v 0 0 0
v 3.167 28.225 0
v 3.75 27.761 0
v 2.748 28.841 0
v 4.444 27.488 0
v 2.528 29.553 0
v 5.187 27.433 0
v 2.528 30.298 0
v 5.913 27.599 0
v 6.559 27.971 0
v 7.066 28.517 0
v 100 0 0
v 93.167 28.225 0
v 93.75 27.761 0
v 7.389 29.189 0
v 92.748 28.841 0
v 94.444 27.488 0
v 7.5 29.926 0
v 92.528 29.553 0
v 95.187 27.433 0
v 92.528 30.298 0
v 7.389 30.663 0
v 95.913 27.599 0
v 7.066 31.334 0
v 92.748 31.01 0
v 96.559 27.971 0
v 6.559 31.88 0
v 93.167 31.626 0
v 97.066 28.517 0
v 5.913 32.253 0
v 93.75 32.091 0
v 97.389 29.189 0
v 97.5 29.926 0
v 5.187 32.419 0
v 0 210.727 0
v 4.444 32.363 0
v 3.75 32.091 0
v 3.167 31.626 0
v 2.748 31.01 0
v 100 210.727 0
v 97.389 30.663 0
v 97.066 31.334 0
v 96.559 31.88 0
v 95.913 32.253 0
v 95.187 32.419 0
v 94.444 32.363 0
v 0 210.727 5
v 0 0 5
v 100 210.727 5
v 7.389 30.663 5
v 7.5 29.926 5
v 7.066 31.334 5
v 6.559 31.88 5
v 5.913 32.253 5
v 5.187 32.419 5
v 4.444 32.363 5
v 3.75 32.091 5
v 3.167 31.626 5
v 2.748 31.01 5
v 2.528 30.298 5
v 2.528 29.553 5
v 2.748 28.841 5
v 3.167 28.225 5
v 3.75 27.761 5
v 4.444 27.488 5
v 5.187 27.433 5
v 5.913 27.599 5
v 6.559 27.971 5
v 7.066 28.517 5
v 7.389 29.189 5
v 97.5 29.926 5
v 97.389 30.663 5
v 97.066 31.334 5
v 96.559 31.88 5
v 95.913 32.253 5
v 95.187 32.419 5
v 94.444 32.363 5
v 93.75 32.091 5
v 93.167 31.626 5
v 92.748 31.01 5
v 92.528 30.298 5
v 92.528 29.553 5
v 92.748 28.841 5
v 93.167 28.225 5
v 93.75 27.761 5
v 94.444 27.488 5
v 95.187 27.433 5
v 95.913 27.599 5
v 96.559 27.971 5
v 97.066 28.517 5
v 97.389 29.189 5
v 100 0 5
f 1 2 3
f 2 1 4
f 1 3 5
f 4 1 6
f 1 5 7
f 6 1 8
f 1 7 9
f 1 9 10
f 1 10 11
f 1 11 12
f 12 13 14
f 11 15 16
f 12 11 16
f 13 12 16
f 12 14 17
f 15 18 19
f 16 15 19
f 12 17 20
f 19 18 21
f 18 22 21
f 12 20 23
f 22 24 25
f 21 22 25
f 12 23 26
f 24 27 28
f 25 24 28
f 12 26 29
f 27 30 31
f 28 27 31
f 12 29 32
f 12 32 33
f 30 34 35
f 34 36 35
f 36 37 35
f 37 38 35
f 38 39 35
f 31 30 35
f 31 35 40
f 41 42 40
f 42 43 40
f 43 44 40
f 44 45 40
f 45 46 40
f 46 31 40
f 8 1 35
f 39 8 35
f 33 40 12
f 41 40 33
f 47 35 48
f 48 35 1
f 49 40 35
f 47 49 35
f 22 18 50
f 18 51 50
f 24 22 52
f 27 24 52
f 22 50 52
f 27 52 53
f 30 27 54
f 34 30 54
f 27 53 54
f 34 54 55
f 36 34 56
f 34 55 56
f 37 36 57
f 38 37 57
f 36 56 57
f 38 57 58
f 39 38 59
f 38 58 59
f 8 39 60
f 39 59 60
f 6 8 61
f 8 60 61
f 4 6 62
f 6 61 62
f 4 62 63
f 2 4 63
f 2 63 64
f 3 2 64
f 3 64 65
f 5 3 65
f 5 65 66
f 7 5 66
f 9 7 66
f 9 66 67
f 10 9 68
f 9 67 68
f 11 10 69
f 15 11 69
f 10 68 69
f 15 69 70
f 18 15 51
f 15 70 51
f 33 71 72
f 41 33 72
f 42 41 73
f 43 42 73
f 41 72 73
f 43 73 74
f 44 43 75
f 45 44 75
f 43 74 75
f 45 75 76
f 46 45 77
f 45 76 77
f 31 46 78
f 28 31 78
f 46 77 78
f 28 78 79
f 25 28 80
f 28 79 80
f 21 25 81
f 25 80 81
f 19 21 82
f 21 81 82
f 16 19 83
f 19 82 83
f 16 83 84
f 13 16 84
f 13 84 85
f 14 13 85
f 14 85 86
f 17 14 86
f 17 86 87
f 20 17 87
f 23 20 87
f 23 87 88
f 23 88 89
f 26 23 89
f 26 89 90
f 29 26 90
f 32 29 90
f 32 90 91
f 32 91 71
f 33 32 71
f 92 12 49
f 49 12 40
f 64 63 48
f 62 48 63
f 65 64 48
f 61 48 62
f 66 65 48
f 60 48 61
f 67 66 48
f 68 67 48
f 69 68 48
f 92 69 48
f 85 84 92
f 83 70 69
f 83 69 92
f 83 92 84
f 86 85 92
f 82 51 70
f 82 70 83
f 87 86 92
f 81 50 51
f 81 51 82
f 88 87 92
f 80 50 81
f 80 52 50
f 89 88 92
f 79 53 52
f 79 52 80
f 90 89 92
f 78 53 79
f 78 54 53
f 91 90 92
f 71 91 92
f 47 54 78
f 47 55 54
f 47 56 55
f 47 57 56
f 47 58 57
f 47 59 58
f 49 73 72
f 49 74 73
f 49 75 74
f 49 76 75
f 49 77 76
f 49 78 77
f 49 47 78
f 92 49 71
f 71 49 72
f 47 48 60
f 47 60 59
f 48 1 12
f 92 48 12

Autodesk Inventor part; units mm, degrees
ref_plane "YZ Plane" through (0, 0, 0) normal (1, 0, 0) x (0, 1, 0)
ref_plane "XZ Plane" through (0, 0, 0) normal (0, 1, 0) x (-1, 0, 0)
ref_plane "XY Plane" through (0, 0, 0) normal (0, 0, 1) x (1, 0, 0)
sketch "Sketch1" plane through (0, 0, 0) normal (0, 0, 1) x (1, 0, 0)
  line L0 (0, 0) -> (100, 0)
  line L1 (100, 0) -> (100, 210.727)
  line L2 (100, 210.727) -> (0, 210.727)
  line L3 (0, 210.727) -> (0, 0)
  dimension "d0" = 100
  dimension "d1" = 210.7269
extrude "Extrusion1" add sketch "Sketch1" along normal blind 5
sketch "Sketch2" plane through (0, 0, 5) normal (0, 0, 1) x (1, 0, 0)
  circle A0 centre (5, 29.9257) radius 2.5
  circle A1 centre (95, 29.9257) radius 2.5
  line L0 (100, 0) -> (100, 210.727) projected
  line L1 (0, 0) -> (100, 0) projected
  dimension "d4" = 5
  dimension "d5" = 5
  dimension "d6" = 95
  dimension "d7" = 5
  dimension "d8" = 29.9257
  dimension "d9" = 29.9257
extrude "Extrusion2" cut sketch "Sketch2" against normal blind 5
properties material "ABS Plastic"
